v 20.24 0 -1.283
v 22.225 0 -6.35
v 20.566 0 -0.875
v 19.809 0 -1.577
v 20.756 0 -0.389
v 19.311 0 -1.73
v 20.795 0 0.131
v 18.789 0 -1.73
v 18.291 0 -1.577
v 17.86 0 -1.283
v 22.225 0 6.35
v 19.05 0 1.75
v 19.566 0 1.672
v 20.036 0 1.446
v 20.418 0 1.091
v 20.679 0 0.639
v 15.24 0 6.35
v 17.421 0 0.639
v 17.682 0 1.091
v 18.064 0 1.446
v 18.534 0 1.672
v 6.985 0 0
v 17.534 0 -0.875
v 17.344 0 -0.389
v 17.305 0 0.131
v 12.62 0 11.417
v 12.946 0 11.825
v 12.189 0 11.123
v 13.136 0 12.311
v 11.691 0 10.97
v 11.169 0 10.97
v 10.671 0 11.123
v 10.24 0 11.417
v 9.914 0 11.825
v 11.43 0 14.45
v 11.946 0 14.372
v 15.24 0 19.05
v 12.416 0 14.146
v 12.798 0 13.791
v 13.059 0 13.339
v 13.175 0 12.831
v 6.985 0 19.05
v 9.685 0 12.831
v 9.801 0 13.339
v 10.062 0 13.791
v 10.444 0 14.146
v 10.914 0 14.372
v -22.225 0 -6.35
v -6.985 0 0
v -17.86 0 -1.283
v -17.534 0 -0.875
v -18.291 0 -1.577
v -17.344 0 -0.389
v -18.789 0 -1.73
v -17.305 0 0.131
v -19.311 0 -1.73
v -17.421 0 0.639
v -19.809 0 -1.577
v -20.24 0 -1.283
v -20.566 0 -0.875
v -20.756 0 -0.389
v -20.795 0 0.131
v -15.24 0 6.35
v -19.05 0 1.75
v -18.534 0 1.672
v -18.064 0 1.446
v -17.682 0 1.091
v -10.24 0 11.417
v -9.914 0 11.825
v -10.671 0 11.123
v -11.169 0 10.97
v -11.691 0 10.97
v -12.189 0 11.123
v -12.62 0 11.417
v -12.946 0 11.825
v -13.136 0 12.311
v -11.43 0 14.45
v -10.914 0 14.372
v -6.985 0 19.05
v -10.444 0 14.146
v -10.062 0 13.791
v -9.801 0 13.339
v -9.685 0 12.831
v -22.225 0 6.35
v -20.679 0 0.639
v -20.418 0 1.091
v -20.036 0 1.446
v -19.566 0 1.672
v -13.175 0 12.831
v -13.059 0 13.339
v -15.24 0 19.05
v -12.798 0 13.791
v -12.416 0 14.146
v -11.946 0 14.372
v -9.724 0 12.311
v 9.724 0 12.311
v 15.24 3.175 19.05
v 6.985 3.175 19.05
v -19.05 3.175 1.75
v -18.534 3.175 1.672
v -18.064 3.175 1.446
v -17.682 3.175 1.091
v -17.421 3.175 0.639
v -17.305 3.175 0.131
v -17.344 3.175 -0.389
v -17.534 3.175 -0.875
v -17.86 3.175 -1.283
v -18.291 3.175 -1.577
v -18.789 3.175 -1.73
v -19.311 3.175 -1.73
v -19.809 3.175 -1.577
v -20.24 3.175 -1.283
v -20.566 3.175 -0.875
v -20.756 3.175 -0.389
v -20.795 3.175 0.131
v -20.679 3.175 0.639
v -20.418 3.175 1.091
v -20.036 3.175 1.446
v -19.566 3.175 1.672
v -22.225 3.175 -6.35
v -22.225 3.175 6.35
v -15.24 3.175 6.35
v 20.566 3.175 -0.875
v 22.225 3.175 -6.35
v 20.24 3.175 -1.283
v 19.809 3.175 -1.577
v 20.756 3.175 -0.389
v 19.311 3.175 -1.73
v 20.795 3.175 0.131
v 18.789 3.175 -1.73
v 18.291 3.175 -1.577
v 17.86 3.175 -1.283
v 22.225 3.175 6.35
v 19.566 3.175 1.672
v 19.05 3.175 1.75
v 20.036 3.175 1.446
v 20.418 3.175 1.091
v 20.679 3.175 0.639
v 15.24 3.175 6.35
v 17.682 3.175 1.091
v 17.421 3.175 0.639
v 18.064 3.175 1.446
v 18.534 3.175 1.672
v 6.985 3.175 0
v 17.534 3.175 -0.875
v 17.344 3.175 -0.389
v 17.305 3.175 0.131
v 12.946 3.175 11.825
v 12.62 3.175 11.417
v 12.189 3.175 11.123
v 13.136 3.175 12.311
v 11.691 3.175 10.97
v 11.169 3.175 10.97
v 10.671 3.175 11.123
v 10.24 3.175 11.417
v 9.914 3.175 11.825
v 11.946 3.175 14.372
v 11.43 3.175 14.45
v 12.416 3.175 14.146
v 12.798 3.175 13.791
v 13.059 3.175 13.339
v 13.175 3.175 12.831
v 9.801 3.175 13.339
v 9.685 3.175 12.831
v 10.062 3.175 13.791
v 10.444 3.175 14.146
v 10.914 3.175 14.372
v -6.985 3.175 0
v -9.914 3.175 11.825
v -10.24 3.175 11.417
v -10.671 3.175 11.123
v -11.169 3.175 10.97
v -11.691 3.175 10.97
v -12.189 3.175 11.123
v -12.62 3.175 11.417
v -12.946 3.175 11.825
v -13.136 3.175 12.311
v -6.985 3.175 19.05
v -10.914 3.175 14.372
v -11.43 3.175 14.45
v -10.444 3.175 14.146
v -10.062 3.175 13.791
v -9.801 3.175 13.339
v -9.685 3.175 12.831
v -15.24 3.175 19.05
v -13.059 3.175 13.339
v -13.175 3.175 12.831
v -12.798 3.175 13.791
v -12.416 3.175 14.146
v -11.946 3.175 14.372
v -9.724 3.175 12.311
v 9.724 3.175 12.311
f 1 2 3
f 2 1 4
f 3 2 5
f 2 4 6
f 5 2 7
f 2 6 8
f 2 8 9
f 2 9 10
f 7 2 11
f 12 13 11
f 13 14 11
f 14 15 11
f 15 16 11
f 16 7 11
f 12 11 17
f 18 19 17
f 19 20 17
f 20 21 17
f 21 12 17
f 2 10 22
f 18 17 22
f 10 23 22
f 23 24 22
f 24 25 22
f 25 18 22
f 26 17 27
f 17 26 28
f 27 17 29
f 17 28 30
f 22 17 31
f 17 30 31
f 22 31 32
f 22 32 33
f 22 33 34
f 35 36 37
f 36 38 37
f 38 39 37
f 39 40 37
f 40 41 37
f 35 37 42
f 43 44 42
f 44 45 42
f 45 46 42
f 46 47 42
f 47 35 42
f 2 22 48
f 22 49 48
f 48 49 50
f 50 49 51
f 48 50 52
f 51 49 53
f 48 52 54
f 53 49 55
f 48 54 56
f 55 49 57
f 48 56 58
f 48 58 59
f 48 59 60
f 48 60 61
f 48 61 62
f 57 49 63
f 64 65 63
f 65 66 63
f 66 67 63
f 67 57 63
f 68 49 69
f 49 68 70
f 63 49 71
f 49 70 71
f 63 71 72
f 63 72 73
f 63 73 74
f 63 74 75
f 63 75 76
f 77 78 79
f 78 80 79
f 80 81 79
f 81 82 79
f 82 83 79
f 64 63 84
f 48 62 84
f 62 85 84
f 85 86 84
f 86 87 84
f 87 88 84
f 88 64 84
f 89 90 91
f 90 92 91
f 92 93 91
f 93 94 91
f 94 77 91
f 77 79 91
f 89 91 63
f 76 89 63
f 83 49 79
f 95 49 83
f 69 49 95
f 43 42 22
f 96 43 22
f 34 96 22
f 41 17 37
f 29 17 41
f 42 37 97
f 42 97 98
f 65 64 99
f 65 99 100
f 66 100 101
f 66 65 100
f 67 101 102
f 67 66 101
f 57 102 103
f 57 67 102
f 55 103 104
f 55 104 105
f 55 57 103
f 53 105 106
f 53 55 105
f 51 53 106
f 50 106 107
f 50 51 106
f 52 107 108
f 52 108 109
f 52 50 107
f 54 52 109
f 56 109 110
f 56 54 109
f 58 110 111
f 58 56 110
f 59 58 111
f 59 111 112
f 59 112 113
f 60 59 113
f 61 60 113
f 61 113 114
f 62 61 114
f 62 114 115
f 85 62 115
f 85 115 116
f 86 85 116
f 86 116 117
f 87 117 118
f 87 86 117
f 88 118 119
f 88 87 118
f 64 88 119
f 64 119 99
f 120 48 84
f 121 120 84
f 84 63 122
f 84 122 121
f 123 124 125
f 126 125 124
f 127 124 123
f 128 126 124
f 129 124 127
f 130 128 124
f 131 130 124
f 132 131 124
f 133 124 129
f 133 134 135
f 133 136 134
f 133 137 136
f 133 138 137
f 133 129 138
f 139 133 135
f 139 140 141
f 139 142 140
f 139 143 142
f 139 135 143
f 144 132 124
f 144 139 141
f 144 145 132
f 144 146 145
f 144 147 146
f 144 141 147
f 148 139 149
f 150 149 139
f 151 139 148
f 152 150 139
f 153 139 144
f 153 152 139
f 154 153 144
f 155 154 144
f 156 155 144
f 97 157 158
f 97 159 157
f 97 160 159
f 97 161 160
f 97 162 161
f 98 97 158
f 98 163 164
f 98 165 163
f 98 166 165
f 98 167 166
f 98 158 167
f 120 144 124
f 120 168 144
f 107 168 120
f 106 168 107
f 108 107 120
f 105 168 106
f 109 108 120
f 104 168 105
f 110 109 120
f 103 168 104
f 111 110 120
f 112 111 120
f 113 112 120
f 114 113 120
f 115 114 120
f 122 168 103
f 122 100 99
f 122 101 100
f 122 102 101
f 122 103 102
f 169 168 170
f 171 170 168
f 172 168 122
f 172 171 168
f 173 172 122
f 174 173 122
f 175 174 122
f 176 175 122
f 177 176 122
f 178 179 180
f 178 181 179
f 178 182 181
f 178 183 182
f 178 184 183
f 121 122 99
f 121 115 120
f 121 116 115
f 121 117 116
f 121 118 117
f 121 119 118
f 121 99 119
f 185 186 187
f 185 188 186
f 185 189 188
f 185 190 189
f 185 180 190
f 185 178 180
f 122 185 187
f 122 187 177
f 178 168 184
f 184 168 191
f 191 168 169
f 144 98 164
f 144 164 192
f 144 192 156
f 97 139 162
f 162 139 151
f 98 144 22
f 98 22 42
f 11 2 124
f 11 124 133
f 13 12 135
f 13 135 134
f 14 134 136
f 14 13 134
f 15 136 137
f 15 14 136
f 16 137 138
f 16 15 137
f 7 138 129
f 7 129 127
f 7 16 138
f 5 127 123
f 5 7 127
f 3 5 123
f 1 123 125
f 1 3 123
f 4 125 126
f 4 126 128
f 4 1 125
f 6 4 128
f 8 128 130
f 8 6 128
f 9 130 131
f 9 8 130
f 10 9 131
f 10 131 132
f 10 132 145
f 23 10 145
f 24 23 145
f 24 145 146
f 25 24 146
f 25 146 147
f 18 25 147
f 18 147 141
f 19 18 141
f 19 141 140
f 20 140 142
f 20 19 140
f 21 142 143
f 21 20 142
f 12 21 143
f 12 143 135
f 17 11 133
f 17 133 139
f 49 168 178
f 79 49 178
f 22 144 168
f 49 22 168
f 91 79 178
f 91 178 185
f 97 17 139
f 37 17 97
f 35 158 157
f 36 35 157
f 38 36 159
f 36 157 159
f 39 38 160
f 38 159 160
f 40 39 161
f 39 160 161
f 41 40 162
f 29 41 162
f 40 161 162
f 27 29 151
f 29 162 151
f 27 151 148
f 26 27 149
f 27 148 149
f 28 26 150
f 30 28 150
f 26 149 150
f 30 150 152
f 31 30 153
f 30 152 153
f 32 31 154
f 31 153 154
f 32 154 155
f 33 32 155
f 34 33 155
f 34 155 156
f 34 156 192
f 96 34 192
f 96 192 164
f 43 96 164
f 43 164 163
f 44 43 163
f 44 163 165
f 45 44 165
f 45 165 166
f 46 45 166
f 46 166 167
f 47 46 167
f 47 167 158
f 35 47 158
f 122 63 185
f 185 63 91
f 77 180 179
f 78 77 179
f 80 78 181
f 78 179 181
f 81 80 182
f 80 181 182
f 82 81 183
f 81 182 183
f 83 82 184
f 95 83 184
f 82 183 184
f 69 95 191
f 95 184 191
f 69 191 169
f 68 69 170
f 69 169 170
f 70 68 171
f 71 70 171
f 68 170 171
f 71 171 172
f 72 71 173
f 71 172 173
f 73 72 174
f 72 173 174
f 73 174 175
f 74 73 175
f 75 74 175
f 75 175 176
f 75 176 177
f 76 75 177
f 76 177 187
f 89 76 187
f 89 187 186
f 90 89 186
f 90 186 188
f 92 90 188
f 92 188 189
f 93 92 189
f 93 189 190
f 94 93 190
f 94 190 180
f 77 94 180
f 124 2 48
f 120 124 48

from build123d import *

# Parameters (mm, degrees)
SKETCH1_W           = 44.45
SKETCH1_H           = 12.7
SKETCH1_R           = 1.75
SKETCH1_W_2         = 30.48
BOSS_EXTRUDE1_DEPTH = 3.175
SKETCH2_R           = 1.75
CUT_EXTRUDE1_DEPTH  = 12.192
SKETCH3_W           = 13.97
SKETCH3_H           = 19.05
CUT_EXTRUDE2_DEPTH  = 25.4


with BuildPart() as part:
    # Sketch1 → Boss-Extrude1 (new body)
    # profile 1 of 2: a face of its own
    with BuildSketch(Plane(origin=(0, 0, 0), x_dir=(-1, 0, 0), z_dir=(0, 1, 0))):
        Rectangle(SKETCH1_W, SKETCH1_H)
        with Locations(Location((19.05, 0, 0), (0, 0, 90))):
            Circle(SKETCH1_R, mode=Mode.SUBTRACT)
        with Locations(Location((-19.05, 0, 0), (0, 0, 90))):
            Circle(SKETCH1_R, mode=Mode.SUBTRACT)
    # profile 2 of 2: a face of its own
    with BuildSketch(Plane(origin=(0, 0, 0), x_dir=(-1, 0, 0), z_dir=(0, 1, 0))):
        with Locations((0, 12.7)):
            Rectangle(SKETCH1_W_2, SKETCH1_H)
    extrude(amount=BOSS_EXTRUDE1_DEPTH)

    # Sketch2 → Cut-Extrude1 (cut)
    with BuildSketch(Plane(origin=(0, 3.175, 0), x_dir=(-1, 0, 0), z_dir=(0, 1, 0))):
        with Locations(Location((-11.43, 12.7, 0), (0, 0, 90))):
            Circle(SKETCH2_R)
        with Locations(Location((11.43, 12.7, 0), (0, 0, 90))):
            Circle(SKETCH2_R)
    extrude(amount=-CUT_EXTRUDE1_DEPTH, mode=Mode.SUBTRACT)

    # Sketch3 → Cut-Extrude2 (cut)
    with BuildSketch(Plane(origin=(0, 3.175, 0), x_dir=(-1, 0, 0), z_dir=(0, 1, 0))):
        with Locations((0, 9.525)):
            Rectangle(SKETCH3_W, SKETCH3_H)
    extrude(amount=-CUT_EXTRUDE2_DEPTH, mode=Mode.SUBTRACT)


solid = part.part
